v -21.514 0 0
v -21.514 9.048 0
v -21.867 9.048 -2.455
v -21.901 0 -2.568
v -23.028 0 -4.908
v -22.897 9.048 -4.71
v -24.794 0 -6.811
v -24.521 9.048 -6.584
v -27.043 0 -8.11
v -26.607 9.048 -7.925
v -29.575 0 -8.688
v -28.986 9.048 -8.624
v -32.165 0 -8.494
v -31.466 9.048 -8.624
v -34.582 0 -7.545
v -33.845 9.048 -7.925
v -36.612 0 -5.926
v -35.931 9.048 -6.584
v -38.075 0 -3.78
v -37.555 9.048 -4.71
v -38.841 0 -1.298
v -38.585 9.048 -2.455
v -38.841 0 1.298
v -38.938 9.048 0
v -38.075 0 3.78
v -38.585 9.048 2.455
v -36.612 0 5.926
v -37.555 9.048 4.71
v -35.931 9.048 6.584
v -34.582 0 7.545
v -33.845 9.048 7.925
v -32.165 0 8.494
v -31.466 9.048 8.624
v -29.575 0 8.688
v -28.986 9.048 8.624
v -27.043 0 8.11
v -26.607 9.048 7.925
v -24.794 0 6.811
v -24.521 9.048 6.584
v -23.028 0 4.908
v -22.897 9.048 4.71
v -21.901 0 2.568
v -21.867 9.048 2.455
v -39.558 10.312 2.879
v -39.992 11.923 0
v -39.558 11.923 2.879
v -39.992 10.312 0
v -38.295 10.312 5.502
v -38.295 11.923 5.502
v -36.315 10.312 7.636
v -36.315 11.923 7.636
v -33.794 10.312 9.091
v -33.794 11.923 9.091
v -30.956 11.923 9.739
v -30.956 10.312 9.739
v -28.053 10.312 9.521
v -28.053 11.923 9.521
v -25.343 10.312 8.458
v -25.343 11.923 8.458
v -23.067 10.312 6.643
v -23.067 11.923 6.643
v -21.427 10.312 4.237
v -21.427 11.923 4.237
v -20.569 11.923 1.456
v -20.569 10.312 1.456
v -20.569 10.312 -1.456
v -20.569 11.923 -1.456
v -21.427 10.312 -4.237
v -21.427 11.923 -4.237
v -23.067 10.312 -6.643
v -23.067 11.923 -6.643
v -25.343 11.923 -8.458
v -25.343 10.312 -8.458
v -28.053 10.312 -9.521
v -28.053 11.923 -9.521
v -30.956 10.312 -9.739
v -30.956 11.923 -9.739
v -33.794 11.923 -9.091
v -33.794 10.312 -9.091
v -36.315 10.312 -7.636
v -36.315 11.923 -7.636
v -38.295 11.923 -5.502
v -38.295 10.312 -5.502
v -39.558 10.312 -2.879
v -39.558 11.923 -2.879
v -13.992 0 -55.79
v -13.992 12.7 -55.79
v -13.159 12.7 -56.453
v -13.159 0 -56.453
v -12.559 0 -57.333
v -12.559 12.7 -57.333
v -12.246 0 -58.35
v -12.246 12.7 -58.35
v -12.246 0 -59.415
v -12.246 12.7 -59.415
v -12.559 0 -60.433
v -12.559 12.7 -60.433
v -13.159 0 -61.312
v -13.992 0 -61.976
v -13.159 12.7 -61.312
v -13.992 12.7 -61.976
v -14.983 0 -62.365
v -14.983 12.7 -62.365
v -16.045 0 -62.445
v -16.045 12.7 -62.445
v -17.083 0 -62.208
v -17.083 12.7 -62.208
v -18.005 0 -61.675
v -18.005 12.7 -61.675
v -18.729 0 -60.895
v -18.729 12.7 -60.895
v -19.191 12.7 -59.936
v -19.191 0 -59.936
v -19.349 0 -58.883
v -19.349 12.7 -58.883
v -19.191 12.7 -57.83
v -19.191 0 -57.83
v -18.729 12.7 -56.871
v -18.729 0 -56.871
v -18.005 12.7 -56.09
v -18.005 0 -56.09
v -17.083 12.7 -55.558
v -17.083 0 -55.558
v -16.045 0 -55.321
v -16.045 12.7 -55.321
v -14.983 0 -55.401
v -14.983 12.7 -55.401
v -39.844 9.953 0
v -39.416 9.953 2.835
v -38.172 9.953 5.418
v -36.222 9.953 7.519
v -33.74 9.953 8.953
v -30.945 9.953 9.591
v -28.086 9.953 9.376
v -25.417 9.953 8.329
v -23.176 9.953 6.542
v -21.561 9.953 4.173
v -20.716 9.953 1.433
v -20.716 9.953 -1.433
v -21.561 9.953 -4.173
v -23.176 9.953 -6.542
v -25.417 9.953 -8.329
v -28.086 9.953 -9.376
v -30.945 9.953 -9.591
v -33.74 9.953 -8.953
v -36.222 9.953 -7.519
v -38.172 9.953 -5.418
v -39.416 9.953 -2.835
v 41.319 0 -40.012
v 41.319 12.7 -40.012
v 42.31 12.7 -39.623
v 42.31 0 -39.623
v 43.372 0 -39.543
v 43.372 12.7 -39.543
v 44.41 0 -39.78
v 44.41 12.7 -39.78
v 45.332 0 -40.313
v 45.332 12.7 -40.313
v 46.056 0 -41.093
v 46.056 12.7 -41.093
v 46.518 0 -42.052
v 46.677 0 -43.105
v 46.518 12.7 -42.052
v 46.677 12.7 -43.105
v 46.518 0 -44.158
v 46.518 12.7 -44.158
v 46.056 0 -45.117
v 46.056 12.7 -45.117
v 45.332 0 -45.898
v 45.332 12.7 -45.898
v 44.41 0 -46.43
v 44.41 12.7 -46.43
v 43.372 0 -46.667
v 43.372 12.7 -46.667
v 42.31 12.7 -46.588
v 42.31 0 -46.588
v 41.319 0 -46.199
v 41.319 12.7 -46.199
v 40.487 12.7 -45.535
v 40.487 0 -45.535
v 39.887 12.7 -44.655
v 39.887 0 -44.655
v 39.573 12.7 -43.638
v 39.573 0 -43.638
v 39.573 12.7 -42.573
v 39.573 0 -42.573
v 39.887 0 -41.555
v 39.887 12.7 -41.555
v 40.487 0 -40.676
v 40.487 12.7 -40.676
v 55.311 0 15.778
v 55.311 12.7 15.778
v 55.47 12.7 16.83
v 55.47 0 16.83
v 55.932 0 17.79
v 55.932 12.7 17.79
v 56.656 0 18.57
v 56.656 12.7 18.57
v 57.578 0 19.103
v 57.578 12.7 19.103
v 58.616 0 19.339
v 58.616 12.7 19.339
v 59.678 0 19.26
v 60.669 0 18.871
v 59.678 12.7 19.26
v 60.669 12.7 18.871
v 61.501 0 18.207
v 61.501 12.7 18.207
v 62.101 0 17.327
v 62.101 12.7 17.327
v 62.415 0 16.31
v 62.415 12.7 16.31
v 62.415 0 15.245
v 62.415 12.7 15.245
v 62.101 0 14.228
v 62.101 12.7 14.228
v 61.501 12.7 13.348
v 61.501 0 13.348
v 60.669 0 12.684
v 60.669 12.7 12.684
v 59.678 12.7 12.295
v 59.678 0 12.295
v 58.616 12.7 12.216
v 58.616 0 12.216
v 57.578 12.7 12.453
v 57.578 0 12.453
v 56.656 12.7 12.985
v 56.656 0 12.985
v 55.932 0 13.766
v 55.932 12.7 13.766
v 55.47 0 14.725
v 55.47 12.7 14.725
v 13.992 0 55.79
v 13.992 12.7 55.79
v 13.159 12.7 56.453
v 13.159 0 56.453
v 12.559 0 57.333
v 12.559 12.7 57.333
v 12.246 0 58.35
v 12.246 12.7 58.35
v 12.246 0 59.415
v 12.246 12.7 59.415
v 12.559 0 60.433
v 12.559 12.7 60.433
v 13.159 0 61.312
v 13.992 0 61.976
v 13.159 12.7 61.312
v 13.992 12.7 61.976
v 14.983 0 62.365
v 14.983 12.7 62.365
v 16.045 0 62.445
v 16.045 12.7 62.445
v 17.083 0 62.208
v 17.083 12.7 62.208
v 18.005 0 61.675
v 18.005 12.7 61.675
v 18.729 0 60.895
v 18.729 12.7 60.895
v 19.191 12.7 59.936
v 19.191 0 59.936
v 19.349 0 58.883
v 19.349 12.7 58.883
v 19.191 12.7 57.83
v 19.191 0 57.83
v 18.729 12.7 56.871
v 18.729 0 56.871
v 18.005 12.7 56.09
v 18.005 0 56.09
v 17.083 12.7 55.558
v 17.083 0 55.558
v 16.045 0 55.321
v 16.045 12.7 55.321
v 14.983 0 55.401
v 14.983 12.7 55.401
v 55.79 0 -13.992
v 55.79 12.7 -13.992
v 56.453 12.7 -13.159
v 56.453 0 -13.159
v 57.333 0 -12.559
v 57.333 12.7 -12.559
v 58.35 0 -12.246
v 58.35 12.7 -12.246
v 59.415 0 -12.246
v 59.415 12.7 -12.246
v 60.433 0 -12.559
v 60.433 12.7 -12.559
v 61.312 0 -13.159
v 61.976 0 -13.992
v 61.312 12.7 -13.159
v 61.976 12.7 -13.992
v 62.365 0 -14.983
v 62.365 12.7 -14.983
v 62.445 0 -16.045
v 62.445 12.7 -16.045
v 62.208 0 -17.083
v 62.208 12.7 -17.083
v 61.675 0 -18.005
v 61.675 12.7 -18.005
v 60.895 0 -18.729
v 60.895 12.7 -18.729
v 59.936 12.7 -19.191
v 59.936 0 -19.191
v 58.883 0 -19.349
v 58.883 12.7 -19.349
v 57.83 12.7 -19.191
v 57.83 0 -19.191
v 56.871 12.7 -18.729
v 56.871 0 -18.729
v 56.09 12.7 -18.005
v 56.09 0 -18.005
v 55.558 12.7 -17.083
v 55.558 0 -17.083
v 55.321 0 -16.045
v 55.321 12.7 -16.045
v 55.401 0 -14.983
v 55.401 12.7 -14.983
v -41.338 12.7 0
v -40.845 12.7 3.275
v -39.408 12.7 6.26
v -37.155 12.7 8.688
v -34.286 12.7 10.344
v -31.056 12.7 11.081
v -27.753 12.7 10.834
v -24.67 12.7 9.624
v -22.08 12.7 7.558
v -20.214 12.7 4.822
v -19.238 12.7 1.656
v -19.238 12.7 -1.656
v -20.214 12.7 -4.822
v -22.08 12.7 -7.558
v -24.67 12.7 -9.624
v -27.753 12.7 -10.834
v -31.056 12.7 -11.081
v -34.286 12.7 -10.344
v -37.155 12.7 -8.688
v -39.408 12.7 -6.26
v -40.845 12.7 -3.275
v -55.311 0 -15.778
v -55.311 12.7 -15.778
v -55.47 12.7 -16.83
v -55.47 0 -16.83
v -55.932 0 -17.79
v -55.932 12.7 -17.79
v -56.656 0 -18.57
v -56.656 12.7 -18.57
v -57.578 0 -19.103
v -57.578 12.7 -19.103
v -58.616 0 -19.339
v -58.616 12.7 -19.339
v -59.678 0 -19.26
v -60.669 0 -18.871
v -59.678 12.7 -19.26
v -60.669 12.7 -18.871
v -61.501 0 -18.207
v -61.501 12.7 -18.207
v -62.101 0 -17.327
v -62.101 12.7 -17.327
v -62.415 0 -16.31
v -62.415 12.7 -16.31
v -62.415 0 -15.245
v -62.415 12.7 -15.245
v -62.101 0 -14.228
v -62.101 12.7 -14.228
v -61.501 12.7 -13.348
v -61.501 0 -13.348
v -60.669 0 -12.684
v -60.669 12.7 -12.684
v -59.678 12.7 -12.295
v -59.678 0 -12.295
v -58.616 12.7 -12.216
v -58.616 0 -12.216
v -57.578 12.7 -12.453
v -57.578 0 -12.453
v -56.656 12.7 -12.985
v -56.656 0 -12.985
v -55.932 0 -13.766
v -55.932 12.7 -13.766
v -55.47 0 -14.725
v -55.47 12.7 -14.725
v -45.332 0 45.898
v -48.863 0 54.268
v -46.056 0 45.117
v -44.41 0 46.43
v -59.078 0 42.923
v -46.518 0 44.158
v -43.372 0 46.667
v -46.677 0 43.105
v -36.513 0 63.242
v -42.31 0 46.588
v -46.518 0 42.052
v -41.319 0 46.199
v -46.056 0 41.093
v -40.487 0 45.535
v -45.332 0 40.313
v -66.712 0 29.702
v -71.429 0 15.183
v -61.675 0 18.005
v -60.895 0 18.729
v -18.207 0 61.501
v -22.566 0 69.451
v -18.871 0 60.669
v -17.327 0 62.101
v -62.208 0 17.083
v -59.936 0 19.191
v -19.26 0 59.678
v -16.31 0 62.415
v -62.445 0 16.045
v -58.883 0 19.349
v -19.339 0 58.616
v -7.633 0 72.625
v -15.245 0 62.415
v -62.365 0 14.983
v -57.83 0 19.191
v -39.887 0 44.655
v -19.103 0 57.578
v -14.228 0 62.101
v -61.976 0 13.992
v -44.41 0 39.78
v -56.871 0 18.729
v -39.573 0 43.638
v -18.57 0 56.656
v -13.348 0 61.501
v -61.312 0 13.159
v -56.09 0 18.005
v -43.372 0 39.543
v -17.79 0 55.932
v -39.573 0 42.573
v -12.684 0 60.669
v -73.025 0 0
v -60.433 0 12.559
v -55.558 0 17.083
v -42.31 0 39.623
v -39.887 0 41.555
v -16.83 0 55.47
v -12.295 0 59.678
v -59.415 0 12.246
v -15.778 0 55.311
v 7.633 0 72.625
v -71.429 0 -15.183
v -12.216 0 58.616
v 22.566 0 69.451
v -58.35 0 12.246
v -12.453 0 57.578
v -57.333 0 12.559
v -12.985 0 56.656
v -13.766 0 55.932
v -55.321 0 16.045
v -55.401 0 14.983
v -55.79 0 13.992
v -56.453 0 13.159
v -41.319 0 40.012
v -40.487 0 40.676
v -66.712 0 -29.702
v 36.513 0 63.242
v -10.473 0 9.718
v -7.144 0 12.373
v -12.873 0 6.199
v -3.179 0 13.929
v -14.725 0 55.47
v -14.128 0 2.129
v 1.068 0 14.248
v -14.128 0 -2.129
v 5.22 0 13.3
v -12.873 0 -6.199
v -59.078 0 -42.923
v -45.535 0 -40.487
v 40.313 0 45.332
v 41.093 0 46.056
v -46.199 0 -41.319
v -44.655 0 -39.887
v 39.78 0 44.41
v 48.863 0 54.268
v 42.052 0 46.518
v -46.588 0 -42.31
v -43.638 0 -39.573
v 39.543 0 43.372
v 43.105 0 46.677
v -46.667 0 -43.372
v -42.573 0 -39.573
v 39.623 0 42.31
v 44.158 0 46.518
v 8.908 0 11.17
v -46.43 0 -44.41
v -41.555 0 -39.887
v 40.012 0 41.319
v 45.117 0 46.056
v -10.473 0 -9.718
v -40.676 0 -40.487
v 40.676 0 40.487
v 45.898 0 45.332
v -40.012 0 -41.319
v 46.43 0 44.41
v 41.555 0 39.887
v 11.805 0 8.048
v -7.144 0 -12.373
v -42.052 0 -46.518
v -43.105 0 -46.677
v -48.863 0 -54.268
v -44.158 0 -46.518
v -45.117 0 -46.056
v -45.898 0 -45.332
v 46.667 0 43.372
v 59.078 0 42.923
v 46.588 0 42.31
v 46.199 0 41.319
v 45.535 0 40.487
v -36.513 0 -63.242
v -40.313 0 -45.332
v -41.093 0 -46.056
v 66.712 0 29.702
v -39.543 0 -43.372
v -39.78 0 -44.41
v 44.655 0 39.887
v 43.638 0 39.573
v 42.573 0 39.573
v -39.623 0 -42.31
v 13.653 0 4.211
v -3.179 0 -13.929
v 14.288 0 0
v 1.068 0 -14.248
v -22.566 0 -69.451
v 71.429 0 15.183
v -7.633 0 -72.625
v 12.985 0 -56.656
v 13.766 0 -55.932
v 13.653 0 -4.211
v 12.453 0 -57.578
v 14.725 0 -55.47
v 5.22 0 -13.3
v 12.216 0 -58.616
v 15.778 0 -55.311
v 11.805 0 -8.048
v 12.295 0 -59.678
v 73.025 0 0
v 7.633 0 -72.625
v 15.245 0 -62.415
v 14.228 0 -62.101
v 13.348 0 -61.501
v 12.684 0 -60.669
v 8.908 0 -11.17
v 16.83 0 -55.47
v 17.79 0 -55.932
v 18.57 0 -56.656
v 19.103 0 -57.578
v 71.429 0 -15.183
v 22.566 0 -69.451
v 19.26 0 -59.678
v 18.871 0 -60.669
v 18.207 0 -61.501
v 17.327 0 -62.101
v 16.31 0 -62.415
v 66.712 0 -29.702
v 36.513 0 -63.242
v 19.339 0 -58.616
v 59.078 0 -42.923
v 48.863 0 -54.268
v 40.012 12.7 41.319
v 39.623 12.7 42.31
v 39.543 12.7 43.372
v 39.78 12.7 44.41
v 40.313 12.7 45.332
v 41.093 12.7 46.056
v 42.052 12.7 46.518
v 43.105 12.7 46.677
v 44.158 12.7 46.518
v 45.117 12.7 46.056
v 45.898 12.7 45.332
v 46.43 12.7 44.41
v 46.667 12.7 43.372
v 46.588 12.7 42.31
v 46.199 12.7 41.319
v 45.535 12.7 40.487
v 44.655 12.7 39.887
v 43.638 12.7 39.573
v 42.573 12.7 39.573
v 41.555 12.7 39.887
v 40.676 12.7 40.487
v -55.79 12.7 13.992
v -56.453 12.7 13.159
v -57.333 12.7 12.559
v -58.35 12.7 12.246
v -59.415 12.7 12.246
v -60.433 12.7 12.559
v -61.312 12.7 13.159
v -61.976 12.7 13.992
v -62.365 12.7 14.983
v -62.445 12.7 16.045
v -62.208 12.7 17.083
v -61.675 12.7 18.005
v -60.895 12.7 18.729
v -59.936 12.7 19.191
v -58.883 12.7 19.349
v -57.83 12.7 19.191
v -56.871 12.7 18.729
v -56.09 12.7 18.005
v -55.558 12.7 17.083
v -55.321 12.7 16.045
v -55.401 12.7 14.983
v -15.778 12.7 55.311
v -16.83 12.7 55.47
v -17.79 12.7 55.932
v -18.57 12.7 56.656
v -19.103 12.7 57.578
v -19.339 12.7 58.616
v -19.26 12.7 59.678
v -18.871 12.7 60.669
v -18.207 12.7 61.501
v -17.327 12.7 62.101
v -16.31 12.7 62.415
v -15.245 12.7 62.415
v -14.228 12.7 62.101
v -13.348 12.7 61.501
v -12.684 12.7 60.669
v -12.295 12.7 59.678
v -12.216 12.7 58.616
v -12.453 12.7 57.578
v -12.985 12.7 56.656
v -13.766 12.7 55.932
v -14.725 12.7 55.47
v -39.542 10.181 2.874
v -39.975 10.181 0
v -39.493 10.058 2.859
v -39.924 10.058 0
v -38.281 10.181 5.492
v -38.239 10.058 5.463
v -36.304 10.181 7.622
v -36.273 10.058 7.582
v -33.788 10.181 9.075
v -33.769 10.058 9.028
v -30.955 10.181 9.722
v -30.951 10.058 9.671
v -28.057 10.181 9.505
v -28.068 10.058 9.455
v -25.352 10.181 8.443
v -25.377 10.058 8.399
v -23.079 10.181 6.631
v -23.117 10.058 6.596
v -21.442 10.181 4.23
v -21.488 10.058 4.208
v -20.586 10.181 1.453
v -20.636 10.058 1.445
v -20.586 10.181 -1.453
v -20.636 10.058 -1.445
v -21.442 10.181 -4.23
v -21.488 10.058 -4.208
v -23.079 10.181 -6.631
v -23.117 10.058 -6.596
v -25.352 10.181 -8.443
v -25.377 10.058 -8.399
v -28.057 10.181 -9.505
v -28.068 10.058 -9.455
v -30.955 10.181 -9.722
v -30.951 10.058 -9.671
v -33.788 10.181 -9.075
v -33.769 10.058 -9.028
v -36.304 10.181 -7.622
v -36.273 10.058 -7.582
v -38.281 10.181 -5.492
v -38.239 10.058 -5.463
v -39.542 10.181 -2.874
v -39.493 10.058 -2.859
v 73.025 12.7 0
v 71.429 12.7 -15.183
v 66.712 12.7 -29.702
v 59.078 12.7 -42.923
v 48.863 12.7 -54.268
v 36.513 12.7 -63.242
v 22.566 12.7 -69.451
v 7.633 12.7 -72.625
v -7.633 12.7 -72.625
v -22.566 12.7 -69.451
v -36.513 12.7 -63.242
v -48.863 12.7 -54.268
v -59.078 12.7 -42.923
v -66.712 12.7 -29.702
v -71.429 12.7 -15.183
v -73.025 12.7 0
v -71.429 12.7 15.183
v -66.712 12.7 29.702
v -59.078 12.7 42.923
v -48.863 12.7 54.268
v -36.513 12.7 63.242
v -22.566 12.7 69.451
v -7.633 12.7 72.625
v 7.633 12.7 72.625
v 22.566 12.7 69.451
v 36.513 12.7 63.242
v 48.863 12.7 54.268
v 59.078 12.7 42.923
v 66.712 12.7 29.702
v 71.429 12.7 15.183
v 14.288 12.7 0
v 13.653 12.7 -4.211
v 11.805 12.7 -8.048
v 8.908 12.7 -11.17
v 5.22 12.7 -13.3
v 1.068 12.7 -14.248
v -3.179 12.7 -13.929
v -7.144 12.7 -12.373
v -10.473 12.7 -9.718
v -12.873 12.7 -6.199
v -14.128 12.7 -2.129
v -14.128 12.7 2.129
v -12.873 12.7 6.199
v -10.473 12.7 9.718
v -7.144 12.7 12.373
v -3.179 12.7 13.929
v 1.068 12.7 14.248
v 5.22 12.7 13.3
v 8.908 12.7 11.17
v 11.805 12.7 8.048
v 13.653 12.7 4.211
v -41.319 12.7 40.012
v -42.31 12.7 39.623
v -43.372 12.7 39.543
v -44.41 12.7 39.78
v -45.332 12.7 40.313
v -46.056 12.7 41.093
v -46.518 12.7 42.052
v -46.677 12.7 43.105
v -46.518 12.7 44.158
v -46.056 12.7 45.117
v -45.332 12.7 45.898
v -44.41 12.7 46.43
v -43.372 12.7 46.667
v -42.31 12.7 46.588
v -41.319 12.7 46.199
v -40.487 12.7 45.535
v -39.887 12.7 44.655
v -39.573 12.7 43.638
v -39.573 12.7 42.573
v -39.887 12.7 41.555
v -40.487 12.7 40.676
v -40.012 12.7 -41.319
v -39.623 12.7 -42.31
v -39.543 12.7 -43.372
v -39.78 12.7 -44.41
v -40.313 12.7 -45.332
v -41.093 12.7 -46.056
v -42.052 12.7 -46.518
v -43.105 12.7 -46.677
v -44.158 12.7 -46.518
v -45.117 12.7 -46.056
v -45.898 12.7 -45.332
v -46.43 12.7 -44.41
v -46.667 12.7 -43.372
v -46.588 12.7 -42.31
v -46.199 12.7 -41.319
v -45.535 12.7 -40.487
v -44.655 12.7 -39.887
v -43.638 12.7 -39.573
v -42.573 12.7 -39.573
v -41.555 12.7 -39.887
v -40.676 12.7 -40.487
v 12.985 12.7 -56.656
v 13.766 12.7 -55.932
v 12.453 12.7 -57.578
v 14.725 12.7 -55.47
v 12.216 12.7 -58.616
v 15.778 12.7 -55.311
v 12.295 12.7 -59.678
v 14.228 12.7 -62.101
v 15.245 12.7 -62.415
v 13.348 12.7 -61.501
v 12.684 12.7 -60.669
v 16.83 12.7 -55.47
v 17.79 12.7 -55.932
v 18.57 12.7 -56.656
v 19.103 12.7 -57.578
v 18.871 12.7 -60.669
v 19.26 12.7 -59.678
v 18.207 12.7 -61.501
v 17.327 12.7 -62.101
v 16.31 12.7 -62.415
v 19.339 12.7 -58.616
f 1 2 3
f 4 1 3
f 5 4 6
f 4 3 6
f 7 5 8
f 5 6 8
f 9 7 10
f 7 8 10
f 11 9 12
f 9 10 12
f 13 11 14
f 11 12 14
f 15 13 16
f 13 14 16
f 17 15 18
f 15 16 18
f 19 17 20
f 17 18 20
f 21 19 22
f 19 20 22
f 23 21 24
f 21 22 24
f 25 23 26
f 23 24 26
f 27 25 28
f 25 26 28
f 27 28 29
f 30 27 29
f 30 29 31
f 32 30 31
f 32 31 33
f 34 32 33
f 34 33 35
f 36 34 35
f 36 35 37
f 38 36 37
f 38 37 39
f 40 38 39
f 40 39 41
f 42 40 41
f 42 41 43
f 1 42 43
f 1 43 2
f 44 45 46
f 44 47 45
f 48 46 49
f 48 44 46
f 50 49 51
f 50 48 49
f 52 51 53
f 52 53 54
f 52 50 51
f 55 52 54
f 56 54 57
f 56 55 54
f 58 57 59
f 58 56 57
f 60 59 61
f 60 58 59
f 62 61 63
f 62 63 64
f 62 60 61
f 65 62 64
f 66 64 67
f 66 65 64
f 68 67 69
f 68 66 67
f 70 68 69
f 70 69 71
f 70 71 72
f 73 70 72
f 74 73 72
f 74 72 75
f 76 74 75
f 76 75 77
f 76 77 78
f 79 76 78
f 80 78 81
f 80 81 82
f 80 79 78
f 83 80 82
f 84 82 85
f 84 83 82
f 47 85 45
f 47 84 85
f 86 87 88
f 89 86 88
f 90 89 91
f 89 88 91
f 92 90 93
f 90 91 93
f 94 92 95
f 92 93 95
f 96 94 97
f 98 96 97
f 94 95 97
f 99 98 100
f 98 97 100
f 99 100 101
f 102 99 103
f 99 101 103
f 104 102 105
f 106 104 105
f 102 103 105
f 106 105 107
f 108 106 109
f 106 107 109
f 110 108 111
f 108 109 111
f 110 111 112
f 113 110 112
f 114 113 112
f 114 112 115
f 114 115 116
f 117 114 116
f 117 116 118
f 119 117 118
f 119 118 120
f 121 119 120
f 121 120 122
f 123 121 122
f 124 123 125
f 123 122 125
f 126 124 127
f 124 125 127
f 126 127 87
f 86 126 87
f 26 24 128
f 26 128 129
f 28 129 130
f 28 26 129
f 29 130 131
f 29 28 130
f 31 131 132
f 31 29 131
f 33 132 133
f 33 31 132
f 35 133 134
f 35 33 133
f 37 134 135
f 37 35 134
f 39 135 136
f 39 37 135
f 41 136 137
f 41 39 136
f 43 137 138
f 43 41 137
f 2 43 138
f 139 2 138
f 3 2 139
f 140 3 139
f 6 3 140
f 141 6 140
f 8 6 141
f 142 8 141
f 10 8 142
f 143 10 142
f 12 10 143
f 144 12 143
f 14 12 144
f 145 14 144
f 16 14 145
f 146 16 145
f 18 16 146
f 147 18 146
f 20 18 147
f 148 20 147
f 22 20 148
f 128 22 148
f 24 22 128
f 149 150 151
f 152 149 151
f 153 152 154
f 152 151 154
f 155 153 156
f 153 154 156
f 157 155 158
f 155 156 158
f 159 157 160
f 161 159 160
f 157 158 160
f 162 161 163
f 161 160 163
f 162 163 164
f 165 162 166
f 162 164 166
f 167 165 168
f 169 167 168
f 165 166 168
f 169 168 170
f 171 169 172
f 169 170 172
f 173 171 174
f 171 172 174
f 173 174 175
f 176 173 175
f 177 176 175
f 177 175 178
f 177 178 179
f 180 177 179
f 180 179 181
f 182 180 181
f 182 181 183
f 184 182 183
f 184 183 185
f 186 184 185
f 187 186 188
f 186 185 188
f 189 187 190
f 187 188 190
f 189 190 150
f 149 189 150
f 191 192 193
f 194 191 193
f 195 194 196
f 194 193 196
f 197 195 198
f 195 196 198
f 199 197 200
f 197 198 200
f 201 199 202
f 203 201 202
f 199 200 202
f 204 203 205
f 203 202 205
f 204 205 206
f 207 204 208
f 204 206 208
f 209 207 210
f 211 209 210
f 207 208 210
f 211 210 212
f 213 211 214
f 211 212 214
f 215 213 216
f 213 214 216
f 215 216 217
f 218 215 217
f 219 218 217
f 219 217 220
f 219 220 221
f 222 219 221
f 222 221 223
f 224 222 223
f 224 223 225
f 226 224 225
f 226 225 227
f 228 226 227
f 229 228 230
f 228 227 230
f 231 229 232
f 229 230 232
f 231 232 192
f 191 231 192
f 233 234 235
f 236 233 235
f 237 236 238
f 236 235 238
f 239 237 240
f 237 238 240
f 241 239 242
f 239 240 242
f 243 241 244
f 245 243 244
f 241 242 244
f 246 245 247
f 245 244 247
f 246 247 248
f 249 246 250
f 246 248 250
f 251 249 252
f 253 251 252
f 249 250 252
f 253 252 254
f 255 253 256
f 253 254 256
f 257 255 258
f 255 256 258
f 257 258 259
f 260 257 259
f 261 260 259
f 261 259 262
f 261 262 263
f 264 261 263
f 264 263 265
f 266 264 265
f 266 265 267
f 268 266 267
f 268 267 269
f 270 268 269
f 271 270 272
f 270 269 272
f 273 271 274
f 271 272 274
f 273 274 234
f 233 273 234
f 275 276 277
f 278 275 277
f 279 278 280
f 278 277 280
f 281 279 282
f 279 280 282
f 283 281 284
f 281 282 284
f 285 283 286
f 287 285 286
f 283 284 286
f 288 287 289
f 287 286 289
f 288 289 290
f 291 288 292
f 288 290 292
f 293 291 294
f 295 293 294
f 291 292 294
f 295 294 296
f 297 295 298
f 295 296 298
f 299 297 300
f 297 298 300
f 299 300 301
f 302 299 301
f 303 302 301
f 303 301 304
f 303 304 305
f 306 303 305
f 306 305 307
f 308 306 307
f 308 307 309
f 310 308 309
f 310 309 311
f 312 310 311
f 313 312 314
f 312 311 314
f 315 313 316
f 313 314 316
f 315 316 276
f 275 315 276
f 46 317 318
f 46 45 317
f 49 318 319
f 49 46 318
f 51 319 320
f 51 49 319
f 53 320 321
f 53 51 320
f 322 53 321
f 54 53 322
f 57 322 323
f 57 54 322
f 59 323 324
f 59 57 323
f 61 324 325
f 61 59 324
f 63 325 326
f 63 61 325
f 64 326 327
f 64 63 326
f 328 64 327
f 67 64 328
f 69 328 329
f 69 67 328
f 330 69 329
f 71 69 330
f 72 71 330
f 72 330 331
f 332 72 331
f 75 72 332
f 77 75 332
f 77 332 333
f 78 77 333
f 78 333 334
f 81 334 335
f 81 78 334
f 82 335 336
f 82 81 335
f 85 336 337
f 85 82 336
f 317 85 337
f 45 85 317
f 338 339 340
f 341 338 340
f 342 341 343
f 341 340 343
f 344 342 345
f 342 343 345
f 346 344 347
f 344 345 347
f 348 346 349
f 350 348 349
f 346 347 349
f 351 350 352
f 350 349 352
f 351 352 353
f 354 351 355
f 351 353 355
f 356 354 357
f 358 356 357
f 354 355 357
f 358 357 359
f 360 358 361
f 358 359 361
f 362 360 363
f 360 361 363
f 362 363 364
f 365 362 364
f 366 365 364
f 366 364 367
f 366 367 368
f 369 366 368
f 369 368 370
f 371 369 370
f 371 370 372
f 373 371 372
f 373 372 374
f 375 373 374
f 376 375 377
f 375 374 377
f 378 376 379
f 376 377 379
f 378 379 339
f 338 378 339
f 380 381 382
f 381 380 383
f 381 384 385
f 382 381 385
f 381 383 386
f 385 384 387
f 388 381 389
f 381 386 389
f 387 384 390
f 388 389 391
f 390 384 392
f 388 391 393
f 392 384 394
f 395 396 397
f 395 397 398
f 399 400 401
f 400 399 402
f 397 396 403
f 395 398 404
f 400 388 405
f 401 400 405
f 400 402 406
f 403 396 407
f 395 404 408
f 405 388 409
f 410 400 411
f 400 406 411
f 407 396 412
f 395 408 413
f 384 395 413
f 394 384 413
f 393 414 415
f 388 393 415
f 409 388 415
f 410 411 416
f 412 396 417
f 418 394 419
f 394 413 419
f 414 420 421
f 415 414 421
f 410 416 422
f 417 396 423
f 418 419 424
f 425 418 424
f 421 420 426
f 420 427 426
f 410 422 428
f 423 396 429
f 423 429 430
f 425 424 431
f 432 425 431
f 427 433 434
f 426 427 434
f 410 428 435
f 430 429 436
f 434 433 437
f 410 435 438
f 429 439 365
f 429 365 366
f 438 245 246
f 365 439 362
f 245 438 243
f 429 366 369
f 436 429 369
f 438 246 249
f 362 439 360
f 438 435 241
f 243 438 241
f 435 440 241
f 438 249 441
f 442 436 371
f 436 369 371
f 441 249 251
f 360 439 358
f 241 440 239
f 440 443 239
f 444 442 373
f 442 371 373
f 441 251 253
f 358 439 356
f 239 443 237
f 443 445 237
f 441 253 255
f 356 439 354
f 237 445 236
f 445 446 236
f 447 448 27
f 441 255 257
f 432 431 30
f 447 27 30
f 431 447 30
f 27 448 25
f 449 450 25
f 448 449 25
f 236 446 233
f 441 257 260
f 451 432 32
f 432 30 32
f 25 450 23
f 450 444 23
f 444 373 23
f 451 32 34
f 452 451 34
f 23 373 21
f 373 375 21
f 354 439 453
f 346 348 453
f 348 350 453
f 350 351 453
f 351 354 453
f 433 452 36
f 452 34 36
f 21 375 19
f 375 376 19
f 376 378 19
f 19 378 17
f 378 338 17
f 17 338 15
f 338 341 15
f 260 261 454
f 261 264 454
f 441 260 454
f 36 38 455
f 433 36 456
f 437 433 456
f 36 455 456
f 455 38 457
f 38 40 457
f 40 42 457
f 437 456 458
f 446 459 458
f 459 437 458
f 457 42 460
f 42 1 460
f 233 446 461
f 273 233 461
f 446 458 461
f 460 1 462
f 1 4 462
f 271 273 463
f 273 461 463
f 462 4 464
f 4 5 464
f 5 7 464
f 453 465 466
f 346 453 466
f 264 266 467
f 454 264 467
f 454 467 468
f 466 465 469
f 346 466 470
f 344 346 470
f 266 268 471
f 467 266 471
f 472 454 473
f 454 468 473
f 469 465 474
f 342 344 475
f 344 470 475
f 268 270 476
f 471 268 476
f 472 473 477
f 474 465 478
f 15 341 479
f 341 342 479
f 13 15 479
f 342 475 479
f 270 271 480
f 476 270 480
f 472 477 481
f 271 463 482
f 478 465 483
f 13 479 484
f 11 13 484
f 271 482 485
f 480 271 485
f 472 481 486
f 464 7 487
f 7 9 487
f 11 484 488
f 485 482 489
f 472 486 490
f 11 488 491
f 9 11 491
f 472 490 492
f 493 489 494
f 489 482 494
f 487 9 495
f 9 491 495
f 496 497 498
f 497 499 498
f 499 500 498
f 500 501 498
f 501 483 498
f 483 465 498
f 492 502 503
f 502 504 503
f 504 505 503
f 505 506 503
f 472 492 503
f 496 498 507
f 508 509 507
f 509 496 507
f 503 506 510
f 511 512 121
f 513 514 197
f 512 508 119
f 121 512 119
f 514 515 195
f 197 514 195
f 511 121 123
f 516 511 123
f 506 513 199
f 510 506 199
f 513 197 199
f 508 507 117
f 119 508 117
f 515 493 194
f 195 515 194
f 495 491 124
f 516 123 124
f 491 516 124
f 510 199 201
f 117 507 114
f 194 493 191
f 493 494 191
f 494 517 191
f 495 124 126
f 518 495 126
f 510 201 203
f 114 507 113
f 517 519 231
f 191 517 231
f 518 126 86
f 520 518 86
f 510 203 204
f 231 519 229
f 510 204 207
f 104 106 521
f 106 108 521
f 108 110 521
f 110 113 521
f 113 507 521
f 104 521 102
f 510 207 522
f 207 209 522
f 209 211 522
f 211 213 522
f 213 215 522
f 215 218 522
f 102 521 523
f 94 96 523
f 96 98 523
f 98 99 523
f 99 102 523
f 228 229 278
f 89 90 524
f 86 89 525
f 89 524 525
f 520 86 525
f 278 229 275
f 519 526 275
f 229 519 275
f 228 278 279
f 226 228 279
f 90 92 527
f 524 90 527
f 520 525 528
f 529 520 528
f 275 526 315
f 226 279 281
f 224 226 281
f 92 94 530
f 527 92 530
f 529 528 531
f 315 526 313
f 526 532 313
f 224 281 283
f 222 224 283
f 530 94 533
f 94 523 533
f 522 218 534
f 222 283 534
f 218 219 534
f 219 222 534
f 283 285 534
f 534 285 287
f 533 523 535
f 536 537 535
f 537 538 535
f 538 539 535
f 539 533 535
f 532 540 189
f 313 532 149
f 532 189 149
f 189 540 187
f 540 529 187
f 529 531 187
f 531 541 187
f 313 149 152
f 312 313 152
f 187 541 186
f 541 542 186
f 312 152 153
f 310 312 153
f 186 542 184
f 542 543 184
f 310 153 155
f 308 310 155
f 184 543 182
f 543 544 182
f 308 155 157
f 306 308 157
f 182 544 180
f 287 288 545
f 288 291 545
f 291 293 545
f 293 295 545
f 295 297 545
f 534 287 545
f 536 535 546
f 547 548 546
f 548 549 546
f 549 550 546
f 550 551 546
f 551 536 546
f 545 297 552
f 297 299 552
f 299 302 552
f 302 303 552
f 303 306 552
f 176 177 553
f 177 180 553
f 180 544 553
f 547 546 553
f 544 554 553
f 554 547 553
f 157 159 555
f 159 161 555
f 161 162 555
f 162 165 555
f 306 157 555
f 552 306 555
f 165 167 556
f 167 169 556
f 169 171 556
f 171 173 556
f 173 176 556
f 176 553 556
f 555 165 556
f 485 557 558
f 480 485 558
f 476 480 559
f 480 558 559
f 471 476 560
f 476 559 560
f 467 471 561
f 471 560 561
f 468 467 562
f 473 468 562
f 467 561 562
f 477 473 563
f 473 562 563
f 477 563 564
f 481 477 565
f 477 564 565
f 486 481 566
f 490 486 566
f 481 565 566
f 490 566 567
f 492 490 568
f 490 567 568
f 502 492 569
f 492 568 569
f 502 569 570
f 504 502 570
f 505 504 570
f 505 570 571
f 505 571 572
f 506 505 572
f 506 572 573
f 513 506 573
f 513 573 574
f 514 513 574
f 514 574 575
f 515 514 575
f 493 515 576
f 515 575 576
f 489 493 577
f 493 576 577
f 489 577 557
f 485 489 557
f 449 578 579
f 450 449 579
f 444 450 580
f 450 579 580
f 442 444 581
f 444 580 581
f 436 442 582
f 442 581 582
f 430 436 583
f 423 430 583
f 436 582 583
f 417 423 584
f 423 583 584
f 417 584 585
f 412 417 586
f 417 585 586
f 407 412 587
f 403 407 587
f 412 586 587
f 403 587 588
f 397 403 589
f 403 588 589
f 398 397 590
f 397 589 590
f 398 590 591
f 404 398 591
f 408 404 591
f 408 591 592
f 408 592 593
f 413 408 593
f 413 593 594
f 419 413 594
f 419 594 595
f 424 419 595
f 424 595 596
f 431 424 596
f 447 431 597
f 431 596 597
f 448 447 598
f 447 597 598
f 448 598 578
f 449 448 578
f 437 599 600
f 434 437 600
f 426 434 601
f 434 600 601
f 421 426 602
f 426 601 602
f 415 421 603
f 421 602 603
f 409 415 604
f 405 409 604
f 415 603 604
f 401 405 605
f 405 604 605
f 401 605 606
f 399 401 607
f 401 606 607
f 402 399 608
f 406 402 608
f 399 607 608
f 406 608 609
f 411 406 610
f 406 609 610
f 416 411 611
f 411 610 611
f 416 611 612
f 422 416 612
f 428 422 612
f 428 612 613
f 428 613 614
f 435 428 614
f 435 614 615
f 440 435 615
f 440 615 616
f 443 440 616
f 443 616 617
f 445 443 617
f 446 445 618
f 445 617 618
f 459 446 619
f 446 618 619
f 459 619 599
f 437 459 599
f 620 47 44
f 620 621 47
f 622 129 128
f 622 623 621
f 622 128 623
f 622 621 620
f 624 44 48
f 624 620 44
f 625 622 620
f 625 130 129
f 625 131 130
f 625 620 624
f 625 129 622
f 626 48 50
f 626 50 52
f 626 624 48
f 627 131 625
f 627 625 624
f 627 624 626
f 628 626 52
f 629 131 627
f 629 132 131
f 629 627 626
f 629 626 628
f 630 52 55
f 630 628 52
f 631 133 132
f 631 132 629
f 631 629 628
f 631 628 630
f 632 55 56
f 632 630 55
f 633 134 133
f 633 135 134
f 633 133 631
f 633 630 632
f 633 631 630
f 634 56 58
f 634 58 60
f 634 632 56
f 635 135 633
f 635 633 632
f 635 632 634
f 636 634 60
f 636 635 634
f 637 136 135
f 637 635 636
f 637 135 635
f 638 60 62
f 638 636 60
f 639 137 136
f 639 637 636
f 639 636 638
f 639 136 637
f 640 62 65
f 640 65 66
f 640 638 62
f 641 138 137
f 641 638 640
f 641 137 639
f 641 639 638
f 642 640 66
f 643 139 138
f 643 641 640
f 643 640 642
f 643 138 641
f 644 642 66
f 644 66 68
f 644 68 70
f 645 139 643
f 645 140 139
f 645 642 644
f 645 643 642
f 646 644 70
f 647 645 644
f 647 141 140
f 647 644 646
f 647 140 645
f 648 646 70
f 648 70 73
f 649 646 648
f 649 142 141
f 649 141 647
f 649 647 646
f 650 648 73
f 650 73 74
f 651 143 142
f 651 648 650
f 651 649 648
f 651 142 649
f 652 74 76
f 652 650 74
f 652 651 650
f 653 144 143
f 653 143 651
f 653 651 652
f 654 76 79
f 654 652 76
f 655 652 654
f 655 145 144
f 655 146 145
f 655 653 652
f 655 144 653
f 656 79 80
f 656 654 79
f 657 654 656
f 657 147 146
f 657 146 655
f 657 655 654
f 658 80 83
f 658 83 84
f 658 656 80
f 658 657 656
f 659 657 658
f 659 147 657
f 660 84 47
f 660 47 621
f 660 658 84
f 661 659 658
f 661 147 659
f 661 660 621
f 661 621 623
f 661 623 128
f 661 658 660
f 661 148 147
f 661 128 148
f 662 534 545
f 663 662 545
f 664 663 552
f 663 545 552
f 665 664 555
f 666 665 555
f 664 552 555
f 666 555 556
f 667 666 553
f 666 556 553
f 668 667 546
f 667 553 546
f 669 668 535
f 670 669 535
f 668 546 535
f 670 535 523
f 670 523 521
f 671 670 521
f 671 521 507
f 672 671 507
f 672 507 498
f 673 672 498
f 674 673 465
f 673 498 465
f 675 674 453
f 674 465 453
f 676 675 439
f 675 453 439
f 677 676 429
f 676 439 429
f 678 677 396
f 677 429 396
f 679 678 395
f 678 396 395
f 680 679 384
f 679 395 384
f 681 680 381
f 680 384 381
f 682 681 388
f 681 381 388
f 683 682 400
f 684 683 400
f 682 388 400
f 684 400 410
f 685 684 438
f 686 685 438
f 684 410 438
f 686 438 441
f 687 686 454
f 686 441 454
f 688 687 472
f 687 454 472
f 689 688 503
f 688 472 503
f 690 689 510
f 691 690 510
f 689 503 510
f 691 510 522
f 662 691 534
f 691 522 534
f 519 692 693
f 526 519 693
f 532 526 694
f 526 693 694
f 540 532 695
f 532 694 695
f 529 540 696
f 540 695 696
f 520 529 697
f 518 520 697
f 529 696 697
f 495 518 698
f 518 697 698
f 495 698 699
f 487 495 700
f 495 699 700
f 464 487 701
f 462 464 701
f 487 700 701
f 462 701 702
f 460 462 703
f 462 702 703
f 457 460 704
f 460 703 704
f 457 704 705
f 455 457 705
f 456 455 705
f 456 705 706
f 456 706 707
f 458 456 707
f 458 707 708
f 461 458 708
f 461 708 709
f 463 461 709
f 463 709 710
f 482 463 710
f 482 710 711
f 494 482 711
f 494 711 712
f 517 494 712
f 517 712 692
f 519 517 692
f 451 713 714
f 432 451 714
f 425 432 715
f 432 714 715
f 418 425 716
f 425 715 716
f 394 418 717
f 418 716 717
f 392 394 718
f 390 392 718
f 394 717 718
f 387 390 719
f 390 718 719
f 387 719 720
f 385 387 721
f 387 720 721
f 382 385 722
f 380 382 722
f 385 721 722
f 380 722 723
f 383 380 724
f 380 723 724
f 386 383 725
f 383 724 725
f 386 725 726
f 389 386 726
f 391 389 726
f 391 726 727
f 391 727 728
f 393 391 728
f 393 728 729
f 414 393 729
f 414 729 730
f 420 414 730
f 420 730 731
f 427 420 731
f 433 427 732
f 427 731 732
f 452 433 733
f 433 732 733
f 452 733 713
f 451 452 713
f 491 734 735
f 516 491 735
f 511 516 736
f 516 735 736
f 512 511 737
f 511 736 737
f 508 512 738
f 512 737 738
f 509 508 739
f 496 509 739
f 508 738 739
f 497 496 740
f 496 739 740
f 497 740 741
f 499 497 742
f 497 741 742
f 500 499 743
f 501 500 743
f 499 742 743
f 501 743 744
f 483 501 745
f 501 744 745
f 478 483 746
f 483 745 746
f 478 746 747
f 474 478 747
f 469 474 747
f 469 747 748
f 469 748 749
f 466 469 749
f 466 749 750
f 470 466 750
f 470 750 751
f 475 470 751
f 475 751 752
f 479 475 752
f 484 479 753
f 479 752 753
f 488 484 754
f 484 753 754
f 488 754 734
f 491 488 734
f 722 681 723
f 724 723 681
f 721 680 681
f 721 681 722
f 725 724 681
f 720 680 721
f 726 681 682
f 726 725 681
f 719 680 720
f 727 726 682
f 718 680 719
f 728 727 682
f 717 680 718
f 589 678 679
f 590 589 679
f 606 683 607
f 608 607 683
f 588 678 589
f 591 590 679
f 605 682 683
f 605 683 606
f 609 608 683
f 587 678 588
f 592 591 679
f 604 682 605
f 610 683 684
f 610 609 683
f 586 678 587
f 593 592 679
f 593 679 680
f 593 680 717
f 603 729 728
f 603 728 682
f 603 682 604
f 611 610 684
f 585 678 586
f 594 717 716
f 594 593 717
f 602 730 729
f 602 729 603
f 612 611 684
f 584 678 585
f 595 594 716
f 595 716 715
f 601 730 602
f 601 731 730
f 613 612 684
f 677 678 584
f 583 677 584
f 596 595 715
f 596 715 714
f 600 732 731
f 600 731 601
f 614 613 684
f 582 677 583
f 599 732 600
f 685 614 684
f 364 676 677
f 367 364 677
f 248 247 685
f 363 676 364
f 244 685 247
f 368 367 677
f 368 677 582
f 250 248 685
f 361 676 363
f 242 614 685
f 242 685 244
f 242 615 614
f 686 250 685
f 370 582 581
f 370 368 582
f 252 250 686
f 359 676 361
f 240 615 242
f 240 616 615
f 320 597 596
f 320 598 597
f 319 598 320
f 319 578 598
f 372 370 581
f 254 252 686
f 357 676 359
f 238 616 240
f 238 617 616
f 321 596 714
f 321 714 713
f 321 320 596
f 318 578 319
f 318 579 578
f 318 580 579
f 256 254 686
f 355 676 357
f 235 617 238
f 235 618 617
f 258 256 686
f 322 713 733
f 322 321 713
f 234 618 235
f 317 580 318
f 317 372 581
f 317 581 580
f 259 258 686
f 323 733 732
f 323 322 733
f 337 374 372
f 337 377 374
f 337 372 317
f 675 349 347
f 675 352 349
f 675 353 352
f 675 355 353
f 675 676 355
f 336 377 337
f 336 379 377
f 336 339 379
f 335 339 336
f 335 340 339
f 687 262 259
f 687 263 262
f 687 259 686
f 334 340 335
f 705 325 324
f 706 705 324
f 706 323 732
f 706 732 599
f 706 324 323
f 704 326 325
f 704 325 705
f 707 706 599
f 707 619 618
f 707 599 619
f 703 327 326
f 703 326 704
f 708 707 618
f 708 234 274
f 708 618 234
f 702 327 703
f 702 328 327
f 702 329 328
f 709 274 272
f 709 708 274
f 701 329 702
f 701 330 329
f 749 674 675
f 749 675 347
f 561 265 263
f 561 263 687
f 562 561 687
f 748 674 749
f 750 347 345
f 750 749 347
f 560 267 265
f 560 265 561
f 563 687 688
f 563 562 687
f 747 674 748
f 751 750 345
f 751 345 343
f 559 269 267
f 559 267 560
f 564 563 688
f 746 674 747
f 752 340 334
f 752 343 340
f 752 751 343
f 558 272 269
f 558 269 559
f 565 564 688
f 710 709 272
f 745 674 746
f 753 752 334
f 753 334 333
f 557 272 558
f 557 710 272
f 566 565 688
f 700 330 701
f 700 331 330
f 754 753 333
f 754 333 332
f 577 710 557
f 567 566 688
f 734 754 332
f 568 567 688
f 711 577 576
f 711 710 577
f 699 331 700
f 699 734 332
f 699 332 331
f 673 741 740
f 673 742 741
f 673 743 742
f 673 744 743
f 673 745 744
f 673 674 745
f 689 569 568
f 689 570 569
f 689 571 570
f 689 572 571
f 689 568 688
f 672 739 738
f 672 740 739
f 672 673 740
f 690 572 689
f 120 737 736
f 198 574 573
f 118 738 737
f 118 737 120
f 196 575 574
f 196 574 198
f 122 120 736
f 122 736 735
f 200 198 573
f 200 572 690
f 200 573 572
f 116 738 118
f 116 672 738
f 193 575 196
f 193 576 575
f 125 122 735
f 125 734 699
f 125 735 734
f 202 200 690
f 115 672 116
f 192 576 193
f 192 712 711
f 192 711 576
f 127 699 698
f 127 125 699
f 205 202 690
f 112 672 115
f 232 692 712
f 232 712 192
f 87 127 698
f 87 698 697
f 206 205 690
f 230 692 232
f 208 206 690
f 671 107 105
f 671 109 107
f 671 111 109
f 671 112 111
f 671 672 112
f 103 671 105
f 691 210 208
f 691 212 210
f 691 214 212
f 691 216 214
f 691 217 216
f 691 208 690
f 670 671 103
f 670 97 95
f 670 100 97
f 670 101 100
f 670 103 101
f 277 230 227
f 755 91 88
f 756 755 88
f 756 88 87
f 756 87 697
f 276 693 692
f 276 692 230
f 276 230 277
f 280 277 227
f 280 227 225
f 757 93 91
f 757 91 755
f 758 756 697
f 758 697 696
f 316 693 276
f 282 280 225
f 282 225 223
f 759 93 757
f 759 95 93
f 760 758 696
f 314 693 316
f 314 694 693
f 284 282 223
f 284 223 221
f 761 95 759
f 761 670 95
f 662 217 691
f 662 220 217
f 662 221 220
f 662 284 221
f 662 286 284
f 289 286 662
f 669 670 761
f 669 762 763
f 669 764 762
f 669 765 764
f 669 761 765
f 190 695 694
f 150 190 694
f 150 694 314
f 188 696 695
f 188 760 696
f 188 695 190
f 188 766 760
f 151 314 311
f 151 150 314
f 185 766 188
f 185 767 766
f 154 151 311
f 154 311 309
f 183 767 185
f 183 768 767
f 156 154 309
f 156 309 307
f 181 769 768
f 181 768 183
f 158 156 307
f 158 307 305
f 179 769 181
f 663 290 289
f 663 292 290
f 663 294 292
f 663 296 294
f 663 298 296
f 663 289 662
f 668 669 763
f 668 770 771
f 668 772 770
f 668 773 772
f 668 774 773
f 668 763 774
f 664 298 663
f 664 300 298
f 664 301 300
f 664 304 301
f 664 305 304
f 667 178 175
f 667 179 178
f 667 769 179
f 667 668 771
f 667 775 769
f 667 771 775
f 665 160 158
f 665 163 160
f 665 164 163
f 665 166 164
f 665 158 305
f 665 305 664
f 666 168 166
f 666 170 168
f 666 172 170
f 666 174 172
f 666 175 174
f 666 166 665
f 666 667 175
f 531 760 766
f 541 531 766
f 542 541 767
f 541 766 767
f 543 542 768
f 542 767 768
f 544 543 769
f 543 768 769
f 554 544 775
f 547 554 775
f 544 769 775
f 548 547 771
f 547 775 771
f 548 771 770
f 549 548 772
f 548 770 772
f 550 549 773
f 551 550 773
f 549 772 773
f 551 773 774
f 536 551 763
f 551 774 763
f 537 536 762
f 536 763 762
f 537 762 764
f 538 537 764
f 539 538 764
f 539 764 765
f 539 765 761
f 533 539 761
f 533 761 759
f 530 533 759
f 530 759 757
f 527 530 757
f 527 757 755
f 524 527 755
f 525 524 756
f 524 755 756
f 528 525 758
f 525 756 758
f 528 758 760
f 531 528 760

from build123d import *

# Parameters (mm, degrees)
TOP_PLATE_DIAMETER_R           = 73.025
TOP_PLATE_EXTRUDE_DEPTH        = 12.7
FUEL_PORT_CLEARANCE_DIAMETER_R = 14.2875
FUEL_PORT_CLEARANCE_HOLE_DEPTH = 105.050907012
ASSEMBLY_BOLT_REACH            = 106.051
ASSEMBLY_BOLT_DIAMETER_R       = 3.571875
CIRPATTERN1_COUNT              = 12
LOX_PORT_REACH                 = 106.051
SKETCH7_R                      = 8.7122


with BuildPart() as part:
    # Top Plate Diameter → Top Plate Extrude (new body)
    with BuildSketch(Plane(origin=(0, 0, 0), x_dir=(1, 0, 0), z_dir=(0, 1, 0))):
        Circle(TOP_PLATE_DIAMETER_R)
    extrude(amount=TOP_PLATE_EXTRUDE_DEPTH)

    # Fuel Port Clearance Diameter → Fuel Port Clearance Hole (cut, through all)
    with BuildSketch(Plane(origin=(0, 12.7, 0), x_dir=(1, 0, 0), z_dir=(0, 1, 0))):
        Circle(FUEL_PORT_CLEARANCE_DIAMETER_R)
    extrude(amount=-FUEL_PORT_CLEARANCE_HOLE_DEPTH, mode=Mode.SUBTRACT)

    # Assembly Bolt Diameter → Assembly Bolt (cut, up to next)
    with BuildSketch(Plane(origin=(0, 12.7, 0), x_dir=(1, 0, 0), z_dir=(0, 1, 0)), mode=Mode.PRIVATE) as assembly_bolt_sk1:
        with Locations((-58.882838371, 15.777608989)):
            Circle(ASSEMBLY_BOLT_DIAMETER_R)
    assembly_bolt_tool1 = extrude(assembly_bolt_sk1.sketch, amount=-ASSEMBLY_BOLT_REACH, mode=Mode.PRIVATE) & part.part
    assembly_bolt = assembly_bolt_tool1.solids().sort_by_distance((-58.882838, 12.7, -15.777609))[0]
    add(assembly_bolt, mode=Mode.SUBTRACT)

    # CirPattern1: Assembly Bolt ×12 about axis
    cirpattern1_axis = Axis((0, 12.7, 0), (0, -1, 0))
    for i in range(1, CIRPATTERN1_COUNT):
        add(assembly_bolt.rotate(cirpattern1_axis, i * 360 / CIRPATTERN1_COUNT), mode=Mode.SUBTRACT)

    # Sketch7 → LOX Port (cut, up to next)
    with BuildSketch(Plane(origin=(0, 12.7, 0), x_dir=(1, 0, 0), z_dir=(0, 1, 0)), mode=Mode.PRIVATE) as lox_port_sk1:
        with Locations((-30.226, 0)):
            Circle(SKETCH7_R)
    lox_port_tool1 = extrude(lox_port_sk1.sketch, amount=-LOX_PORT_REACH, mode=Mode.PRIVATE) & part.part
    add(lox_port_tool1.solids().sort_by_distance((-30.226, 12.7, 0))[0], mode=Mode.SUBTRACT)

    # Sketch9 → Cut-Revolve1 (revolve, cut)
    with BuildSketch(Plane.XY):
        with BuildLine():
            Line((-41.3385, 12.7), (-39.9923, 11.922771068))
            Line((-39.9923, 11.922771068), (-39.9923, 10.3124))
            ThreePointArc((-39.9923, 10.3124), (-39.953630803, 10.117996816), (-39.843510245, 9.953189755))
            Line((-39.843510245, 9.953189755), (-38.9382, 9.04787951))
            Line((-38.9382, 9.04787951), (-38.9382, 12.7))
            Line((-38.9382, 12.7), (-41.3385, 12.7))
        make_face()
    revolve(axis=Axis((-30.226, -7.468881995, 0), (0, 1, 0)), mode=Mode.SUBTRACT)


solid = part.part
